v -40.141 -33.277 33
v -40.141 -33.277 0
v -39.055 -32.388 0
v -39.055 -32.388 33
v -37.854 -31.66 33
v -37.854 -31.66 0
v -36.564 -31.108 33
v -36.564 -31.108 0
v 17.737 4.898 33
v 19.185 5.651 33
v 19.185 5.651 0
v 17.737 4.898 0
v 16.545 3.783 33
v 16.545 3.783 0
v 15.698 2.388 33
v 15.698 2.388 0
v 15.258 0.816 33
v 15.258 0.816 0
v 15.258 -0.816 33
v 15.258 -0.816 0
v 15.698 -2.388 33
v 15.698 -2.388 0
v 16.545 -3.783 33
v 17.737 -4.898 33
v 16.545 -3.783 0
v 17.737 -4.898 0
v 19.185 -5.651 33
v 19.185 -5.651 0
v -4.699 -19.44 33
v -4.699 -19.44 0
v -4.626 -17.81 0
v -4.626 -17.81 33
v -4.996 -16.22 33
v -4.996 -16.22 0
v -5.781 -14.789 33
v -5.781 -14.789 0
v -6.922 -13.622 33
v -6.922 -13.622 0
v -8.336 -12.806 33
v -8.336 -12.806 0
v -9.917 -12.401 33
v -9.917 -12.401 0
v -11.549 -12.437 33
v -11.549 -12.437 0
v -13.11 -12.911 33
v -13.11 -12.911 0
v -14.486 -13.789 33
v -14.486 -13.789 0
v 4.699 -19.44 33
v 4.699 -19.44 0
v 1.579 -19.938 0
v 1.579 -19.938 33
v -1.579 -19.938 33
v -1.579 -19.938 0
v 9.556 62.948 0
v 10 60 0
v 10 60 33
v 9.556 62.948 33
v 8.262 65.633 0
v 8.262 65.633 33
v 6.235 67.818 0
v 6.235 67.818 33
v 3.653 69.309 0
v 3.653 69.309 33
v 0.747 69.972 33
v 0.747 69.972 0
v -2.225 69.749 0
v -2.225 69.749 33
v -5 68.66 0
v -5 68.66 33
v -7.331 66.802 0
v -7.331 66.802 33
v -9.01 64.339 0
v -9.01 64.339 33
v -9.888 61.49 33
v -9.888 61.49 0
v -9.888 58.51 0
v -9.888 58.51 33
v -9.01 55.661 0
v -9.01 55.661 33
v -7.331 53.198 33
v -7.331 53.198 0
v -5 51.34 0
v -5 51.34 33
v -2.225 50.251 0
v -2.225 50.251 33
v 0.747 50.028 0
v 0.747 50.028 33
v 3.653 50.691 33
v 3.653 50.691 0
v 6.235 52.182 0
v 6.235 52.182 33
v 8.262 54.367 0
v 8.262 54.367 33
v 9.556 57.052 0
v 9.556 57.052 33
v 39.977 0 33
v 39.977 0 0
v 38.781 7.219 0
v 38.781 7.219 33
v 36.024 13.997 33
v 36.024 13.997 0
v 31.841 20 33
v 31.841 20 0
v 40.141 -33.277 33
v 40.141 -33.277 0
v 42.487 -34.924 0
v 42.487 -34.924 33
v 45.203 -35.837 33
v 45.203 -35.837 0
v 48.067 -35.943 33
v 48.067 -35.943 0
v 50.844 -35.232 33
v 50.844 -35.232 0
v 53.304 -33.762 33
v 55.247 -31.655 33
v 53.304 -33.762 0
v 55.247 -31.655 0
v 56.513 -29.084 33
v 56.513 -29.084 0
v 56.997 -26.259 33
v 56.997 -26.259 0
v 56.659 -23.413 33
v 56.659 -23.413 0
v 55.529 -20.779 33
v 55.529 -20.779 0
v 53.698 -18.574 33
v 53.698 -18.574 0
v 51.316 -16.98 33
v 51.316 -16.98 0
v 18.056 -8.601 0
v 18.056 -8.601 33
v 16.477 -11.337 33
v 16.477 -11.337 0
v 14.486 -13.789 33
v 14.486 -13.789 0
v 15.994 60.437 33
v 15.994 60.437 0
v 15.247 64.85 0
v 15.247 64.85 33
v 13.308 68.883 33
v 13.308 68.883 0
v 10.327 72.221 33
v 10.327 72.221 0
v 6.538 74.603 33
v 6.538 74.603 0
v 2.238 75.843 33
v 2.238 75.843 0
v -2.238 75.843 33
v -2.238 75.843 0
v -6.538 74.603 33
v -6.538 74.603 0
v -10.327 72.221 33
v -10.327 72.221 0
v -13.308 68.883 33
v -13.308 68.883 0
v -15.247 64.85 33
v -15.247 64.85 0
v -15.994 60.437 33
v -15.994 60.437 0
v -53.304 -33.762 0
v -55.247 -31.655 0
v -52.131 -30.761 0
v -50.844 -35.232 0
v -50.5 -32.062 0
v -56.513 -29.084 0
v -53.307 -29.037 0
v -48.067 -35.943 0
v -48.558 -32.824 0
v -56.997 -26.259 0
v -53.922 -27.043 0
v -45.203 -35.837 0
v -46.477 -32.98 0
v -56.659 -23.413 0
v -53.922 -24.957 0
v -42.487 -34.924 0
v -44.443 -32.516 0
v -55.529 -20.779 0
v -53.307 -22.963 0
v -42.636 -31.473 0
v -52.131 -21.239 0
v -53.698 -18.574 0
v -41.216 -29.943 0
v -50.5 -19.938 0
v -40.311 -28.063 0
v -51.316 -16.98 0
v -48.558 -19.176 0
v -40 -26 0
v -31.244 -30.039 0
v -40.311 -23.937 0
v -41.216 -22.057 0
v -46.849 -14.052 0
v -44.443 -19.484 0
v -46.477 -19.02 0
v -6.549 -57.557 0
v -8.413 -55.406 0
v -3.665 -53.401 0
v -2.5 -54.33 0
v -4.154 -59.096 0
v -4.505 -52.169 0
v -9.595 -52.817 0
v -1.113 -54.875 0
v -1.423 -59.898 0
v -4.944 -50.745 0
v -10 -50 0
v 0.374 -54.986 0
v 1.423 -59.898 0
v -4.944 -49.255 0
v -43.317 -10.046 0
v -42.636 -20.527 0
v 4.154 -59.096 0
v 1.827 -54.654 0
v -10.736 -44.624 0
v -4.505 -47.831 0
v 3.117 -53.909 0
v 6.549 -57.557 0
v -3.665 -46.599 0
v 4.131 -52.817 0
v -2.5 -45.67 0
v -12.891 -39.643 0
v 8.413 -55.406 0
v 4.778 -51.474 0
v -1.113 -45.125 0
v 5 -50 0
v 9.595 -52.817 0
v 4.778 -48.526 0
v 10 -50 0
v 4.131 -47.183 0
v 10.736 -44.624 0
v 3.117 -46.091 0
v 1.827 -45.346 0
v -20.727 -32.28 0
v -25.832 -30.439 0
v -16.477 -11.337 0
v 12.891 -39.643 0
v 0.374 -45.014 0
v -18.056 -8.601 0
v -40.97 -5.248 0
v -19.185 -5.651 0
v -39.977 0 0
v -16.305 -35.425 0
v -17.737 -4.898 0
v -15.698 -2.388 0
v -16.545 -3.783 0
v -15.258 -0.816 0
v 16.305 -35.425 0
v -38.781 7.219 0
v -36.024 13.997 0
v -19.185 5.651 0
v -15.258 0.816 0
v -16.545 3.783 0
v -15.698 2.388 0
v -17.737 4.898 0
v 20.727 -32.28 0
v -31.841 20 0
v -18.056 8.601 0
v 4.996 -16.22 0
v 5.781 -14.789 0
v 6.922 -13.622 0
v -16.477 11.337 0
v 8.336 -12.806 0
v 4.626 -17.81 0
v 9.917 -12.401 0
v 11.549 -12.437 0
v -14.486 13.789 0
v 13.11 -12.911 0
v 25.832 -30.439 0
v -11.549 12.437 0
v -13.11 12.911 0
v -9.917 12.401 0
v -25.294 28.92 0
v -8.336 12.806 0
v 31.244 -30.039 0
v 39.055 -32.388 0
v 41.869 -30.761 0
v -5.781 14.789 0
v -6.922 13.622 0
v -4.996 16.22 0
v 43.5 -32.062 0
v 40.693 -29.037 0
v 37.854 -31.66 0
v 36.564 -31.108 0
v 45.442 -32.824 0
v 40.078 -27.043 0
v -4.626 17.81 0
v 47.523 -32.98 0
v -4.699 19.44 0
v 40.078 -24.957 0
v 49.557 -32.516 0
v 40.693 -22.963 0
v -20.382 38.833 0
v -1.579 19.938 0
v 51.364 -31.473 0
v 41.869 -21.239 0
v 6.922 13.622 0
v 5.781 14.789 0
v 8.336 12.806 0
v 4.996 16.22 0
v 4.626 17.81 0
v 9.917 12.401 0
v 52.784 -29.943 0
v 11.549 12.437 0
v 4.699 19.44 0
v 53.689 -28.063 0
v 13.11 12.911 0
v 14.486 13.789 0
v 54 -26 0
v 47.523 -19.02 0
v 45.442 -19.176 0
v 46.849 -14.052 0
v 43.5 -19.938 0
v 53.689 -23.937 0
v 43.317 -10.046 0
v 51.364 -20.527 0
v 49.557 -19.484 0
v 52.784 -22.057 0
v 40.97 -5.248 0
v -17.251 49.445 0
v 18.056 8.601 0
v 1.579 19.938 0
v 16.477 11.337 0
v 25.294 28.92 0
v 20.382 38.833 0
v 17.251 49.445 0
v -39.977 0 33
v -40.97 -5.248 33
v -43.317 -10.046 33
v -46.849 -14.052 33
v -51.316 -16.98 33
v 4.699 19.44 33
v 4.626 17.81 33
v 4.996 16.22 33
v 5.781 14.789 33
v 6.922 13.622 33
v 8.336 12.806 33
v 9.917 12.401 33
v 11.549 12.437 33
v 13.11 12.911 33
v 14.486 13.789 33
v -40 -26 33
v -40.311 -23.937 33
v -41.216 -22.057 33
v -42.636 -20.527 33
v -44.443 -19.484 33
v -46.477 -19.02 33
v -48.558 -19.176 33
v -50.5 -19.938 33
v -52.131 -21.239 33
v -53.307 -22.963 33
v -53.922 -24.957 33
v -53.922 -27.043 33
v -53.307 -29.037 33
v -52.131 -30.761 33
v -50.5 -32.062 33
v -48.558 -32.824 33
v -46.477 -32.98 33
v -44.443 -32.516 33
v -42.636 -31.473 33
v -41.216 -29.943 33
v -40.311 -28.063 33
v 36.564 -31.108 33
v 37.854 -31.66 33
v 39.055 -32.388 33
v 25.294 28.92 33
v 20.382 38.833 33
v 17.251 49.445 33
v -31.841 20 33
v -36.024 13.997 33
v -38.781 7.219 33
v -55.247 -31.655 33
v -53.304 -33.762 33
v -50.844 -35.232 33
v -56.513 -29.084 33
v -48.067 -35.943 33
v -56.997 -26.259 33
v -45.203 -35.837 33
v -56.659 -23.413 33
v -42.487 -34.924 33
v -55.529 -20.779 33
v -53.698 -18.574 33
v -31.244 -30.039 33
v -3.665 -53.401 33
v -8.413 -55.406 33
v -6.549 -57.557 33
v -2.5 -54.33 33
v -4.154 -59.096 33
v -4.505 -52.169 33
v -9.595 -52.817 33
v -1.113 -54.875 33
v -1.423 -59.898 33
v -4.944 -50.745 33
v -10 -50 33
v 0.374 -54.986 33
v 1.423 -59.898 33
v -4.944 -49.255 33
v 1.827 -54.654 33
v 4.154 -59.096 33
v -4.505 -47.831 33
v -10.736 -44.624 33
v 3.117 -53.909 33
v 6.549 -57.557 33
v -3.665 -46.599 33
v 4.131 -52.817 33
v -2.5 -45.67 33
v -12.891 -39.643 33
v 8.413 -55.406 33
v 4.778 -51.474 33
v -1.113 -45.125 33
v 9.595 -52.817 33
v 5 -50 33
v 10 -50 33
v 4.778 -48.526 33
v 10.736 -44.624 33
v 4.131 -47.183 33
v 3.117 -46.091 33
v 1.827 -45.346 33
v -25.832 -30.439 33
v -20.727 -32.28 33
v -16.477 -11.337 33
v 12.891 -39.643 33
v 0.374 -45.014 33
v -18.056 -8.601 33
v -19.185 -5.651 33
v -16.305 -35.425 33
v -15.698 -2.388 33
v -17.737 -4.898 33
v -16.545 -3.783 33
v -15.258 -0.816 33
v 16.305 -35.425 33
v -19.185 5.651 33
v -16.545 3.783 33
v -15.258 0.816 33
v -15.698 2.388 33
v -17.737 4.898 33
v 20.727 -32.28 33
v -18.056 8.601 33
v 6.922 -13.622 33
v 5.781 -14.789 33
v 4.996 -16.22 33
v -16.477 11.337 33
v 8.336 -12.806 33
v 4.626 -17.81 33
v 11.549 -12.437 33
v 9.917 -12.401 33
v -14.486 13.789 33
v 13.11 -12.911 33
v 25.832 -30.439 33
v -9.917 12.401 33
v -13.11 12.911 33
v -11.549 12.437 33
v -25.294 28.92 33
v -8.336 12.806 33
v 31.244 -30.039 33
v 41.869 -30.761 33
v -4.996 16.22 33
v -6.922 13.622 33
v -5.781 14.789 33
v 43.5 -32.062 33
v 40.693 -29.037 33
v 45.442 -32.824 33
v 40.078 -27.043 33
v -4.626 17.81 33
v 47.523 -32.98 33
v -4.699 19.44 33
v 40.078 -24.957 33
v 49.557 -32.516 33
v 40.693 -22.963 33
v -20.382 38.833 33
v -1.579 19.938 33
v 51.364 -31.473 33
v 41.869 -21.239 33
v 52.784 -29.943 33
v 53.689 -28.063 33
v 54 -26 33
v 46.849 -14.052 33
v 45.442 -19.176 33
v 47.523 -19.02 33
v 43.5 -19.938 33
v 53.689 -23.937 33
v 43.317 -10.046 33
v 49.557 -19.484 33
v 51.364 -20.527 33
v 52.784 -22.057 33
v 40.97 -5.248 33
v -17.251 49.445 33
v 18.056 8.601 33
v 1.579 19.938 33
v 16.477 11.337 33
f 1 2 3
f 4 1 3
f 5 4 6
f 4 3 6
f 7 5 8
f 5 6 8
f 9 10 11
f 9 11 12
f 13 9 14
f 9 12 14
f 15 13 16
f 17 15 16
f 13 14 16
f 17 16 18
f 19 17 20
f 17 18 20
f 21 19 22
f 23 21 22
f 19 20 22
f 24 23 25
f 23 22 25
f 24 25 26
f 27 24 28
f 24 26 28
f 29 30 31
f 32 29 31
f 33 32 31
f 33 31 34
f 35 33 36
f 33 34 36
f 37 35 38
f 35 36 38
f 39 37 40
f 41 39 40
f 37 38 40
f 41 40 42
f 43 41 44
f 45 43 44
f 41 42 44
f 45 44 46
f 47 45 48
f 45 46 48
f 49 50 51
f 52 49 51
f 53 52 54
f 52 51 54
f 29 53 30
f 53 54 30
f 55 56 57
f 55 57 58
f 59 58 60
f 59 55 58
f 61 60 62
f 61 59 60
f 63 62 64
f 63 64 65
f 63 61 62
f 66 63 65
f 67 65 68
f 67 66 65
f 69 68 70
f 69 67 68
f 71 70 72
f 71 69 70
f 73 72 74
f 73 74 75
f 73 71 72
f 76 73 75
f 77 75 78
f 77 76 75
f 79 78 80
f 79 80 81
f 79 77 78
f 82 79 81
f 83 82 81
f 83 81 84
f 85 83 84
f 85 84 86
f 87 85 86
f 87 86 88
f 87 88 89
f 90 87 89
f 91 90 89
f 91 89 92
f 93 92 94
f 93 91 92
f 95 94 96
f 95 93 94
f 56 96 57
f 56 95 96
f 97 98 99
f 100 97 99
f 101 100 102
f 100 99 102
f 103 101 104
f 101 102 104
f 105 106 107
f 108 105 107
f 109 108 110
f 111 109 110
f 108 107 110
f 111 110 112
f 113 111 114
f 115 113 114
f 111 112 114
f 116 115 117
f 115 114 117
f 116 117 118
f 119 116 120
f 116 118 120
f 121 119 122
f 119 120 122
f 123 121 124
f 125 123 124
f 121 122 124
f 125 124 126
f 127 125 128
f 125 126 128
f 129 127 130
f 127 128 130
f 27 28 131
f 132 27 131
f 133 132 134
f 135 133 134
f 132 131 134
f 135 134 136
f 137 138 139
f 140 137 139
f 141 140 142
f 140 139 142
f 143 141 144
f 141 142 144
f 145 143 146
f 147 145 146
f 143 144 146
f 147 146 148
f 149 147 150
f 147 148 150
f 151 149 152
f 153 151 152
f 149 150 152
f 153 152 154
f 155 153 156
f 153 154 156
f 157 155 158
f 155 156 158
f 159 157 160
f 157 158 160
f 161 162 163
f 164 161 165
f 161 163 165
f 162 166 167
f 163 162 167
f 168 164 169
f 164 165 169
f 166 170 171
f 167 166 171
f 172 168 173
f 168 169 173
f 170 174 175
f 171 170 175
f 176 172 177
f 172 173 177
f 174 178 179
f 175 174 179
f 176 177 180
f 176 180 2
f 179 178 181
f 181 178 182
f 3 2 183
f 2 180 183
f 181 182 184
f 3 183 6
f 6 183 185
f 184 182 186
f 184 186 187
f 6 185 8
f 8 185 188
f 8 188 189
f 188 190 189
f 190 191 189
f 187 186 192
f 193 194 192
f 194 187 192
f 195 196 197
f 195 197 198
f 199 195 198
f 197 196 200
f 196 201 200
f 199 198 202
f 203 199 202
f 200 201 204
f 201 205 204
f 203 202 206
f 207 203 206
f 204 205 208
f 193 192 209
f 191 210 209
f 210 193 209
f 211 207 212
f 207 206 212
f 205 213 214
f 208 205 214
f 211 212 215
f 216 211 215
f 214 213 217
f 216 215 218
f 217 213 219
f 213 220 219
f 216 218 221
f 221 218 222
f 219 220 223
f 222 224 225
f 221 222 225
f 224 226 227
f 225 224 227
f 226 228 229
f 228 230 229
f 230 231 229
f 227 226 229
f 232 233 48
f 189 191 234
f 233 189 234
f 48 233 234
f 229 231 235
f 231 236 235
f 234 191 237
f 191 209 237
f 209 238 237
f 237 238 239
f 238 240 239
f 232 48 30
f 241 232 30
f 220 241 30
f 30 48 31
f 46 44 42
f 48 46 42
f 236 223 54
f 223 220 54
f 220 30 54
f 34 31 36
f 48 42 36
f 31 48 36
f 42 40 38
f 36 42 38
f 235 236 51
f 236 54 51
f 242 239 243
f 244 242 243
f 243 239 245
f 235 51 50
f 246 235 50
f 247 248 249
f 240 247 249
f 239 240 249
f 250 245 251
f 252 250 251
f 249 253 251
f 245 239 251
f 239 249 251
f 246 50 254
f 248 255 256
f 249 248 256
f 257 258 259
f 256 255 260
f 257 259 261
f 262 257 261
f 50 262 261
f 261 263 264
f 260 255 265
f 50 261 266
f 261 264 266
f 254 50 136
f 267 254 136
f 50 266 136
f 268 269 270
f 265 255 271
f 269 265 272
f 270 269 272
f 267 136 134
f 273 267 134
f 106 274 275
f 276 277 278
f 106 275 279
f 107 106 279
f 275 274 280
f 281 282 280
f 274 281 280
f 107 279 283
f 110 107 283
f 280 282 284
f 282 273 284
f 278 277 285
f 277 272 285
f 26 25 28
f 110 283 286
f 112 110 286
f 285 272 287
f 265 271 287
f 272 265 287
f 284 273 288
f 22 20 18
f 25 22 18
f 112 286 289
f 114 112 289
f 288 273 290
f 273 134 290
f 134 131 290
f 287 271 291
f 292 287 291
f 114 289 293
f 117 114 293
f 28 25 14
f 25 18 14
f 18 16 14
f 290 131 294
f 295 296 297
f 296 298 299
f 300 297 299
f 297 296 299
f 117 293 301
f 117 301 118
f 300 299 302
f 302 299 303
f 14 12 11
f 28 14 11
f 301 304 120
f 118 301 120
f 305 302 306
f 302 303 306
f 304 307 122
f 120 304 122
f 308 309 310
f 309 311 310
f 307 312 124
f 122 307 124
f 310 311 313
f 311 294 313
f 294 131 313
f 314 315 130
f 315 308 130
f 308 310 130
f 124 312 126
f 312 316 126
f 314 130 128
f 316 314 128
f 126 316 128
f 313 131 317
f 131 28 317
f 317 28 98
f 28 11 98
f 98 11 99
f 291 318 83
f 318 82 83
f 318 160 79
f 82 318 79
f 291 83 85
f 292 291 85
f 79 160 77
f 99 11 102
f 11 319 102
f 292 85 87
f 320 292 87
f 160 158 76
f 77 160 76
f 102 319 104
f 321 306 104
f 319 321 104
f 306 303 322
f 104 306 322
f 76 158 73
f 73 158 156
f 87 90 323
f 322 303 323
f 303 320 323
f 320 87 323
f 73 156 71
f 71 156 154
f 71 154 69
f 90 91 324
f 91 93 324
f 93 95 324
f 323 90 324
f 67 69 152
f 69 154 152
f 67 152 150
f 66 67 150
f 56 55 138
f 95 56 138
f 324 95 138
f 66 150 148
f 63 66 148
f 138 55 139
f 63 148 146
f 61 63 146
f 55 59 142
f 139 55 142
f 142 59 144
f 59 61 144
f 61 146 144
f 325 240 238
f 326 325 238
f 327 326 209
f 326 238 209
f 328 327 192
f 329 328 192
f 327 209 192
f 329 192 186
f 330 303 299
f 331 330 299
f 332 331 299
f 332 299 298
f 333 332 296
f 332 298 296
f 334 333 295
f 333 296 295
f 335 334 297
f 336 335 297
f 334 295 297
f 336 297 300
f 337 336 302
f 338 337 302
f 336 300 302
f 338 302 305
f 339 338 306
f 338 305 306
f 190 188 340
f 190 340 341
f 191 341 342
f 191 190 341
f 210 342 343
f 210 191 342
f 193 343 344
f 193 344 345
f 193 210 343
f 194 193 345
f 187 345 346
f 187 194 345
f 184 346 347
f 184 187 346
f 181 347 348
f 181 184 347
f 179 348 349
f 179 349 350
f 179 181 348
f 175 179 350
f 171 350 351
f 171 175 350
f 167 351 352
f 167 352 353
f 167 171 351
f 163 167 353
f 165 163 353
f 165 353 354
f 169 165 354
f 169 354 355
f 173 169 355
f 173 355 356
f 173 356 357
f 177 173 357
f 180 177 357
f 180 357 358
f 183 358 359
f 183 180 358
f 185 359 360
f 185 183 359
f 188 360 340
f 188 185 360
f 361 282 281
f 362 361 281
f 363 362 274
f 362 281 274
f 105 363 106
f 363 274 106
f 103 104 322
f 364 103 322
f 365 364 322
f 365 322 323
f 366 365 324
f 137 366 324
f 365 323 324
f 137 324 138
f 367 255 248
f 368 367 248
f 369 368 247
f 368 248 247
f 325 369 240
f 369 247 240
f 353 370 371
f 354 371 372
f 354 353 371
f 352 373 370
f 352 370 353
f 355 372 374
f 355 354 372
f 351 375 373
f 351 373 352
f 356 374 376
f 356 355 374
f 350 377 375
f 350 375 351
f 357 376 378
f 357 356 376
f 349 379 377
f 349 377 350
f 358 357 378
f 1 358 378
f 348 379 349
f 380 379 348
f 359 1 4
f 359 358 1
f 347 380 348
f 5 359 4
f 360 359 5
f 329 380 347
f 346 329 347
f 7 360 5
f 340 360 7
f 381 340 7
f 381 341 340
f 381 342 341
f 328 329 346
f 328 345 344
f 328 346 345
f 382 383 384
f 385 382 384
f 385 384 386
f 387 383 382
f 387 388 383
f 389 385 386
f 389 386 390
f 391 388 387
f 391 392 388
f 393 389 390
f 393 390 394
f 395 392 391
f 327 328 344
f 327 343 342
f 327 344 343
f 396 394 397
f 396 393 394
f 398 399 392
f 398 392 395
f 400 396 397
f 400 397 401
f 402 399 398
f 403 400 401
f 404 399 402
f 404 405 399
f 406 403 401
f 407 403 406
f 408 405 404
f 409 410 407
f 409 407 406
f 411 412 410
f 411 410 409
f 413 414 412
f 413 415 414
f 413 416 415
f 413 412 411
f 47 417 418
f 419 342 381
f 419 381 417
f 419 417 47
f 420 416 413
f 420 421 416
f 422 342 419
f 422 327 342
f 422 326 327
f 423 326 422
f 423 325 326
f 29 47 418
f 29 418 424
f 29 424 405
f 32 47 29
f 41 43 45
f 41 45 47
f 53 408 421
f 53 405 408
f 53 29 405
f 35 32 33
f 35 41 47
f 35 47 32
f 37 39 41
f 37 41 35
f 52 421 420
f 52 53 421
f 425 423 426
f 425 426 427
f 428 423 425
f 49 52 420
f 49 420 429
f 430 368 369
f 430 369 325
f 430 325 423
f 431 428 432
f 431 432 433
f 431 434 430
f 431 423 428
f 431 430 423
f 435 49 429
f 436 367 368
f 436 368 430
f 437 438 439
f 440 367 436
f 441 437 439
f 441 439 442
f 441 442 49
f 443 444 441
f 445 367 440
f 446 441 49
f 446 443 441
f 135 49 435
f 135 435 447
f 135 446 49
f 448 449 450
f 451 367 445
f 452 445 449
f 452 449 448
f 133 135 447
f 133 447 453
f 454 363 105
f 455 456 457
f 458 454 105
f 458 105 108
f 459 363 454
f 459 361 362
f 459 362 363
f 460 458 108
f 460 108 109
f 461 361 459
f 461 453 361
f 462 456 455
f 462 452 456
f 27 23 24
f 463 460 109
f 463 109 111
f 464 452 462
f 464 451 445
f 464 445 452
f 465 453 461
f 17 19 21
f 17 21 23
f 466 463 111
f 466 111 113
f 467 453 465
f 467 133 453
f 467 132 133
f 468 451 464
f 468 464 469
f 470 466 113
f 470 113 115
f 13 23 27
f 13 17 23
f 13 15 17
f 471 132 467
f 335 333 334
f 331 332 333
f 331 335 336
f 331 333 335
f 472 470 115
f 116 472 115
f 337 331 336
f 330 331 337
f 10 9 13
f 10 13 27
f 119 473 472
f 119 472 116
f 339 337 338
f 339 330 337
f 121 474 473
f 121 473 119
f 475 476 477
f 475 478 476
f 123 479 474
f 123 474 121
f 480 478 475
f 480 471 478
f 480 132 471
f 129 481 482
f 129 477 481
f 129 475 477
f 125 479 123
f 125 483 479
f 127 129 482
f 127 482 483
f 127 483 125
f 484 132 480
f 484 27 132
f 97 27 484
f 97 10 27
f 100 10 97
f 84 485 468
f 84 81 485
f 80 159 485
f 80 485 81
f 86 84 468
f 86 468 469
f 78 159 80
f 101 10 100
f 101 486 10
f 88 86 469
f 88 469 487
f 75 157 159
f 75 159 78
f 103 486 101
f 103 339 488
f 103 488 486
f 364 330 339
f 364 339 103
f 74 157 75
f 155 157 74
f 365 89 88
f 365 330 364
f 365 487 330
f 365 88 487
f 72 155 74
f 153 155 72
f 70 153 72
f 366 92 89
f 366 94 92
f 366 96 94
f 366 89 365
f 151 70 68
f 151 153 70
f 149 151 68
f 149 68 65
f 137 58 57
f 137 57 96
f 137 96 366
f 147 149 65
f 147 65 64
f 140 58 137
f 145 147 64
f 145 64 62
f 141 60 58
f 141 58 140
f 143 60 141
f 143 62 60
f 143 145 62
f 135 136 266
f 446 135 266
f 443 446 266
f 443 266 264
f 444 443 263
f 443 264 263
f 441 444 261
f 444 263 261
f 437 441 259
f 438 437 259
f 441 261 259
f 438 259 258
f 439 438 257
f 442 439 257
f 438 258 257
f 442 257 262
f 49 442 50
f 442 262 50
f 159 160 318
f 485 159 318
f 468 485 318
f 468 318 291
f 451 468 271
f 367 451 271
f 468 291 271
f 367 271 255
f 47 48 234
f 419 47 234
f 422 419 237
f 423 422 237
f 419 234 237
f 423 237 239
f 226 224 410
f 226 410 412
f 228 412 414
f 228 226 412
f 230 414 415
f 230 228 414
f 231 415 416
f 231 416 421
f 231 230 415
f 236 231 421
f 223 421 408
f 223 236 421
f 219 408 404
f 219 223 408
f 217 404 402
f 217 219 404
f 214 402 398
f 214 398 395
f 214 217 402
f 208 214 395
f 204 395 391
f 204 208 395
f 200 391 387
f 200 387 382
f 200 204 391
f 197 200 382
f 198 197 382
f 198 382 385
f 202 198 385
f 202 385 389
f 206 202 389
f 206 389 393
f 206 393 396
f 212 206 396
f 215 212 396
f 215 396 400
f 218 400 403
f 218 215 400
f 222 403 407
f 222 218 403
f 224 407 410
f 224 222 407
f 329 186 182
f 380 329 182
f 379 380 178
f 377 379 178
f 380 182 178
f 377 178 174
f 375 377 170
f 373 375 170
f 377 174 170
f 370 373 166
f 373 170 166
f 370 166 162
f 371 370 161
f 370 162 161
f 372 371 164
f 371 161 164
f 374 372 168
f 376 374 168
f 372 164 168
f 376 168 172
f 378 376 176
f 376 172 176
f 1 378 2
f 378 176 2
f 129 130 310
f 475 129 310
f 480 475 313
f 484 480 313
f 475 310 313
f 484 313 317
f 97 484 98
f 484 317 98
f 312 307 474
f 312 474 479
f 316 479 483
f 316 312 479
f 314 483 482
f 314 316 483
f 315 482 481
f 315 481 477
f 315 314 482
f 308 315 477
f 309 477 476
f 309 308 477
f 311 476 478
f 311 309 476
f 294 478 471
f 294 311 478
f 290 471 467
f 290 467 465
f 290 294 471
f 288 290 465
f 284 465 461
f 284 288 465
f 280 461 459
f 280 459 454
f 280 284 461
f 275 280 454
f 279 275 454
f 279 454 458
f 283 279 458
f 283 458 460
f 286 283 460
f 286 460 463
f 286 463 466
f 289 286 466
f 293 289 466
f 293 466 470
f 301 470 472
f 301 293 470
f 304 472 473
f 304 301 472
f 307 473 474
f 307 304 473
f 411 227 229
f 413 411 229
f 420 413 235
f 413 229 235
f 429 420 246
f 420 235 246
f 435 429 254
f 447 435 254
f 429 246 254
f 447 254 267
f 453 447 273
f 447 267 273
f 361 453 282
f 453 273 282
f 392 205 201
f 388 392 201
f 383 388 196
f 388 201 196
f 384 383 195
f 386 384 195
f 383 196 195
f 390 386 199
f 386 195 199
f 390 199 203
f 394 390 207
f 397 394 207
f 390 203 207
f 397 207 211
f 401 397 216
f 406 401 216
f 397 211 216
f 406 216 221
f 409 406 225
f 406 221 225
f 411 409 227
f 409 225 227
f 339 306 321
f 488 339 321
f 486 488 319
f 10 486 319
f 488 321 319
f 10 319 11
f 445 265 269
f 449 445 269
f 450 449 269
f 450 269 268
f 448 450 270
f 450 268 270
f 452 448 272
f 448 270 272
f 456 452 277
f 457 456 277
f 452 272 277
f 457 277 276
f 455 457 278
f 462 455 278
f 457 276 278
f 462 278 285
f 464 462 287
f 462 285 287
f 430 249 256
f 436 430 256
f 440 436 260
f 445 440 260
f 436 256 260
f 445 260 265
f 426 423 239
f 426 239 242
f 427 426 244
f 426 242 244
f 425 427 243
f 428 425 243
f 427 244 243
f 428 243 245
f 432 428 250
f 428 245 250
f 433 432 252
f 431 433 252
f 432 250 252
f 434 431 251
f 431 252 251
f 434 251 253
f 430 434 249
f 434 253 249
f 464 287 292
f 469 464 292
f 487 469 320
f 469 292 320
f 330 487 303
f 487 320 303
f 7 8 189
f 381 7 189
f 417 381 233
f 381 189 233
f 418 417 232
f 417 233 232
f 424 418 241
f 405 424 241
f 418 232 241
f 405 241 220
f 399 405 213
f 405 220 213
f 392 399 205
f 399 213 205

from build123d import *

# Parameters (mm, degrees)
SKETCH1_R           = 7
SKETCH1_R_2         = 5
SKETCH1_R_3         = 10
BOSS_EXTRUDE1_DEPTH = 33


with BuildPart() as part:
    # Sketch1 → Boss-Extrude1 (new body)
    with BuildSketch(Plane.XY):
        with BuildLine():
            ThreePointArc((15.994033369, 60.436917155), (0, 76), (-15.994033369, 60.436917155))
            ThreePointArc((-15.994033369, 60.436917155), (-20.382321677, 38.833168081), (-31.840542672, 20))
            ThreePointArc((-31.840542672, 20), (-37.590888328, 10.684300366), (-39.97719521, 0))
            ThreePointArc((-39.97719521, 0), (-43.316807871, -10.045731282), (-51.316335778, -16.979509689))
            ThreePointArc((-51.316335778, -16.979509689), (-55.247302477, -31.655263199), (-40.141001052, -33.276959078))
            ThreePointArc((-40.141001052, -33.276959078), (-38.467197276, -32.003260227), (-36.564004207, -31.107836313))
            ThreePointArc((-36.564004207, -31.107836313), (-18.40862571, -33.701532524), (-10, -50))
            ThreePointArc((-10, -50), (0, -60), (10, -50))
            ThreePointArc((10, -50), (18.40862571, -33.701532524), (36.564004207, -31.107836313))
            ThreePointArc((36.564004207, -31.107836313), (38.467197276, -32.003260227), (40.141001052, -33.276959078))
            ThreePointArc((40.141001052, -33.276959078), (55.247302477, -31.655263199), (51.316335778, -16.979509689))
            ThreePointArc((51.316335778, -16.979509689), (43.316807871, -10.045731282), (39.97719521, 0))
            ThreePointArc((39.97719521, 0), (37.590888328, 10.684300366), (31.840542672, 20))
            ThreePointArc((31.840542672, 20), (20.382321677, 38.833168081), (15.994033369, 60.436917155))
        make_face()
        with Locations((-47, -26)):
            Circle(SKETCH1_R, mode=Mode.SUBTRACT)
        with Locations((0, -50)):
            Circle(SKETCH1_R_2, mode=Mode.SUBTRACT)
        with BuildLine():
            ThreePointArc((-14.486315543, 13.789367716), (-7.601024573, 13.16536075), (-4.698784972, 19.440201125))
            ThreePointArc((-4.698784972, 19.440201125), (0, 20), (4.698784972, 19.440201125))
            ThreePointArc((4.698784972, 19.440201125), (7.601024573, 13.16536075), (14.486315543, 13.789367716))
            ThreePointArc((14.486315543, 13.789367716), (17.320508076, 10), (19.185100515, 5.65083341))
            ThreePointArc((19.185100515, 5.65083341), (15.202049146, 0), (19.185100515, -5.65083341))
            ThreePointArc((19.185100515, -5.65083341), (17.320508076, -10), (14.486315543, -13.789367716))
            ThreePointArc((14.486315543, -13.789367716), (7.601024573, -13.16536075), (4.698784972, -19.440201125))
            ThreePointArc((4.698784972, -19.440201125), (0, -20), (-4.698784972, -19.440201125))
            ThreePointArc((-4.698784972, -19.440201125), (-7.601024573, -13.16536075), (-14.486315543, -13.789367716))
            ThreePointArc((-14.486315543, -13.789367716), (-17.320508076, -10), (-19.185100515, -5.65083341))
            ThreePointArc((-19.185100515, -5.65083341), (-15.202049146, 0), (-19.185100515, 5.65083341))
            ThreePointArc((-19.185100515, 5.65083341), (-17.320508076, 10), (-14.486315543, 13.789367716))
        make_face(mode=Mode.SUBTRACT)
        with Locations((47, -26)):
            Circle(SKETCH1_R, mode=Mode.SUBTRACT)
        with Locations((0, 60)):
            Circle(SKETCH1_R_3, mode=Mode.SUBTRACT)
    extrude(amount=BOSS_EXTRUDE1_DEPTH)


solid = part.part
